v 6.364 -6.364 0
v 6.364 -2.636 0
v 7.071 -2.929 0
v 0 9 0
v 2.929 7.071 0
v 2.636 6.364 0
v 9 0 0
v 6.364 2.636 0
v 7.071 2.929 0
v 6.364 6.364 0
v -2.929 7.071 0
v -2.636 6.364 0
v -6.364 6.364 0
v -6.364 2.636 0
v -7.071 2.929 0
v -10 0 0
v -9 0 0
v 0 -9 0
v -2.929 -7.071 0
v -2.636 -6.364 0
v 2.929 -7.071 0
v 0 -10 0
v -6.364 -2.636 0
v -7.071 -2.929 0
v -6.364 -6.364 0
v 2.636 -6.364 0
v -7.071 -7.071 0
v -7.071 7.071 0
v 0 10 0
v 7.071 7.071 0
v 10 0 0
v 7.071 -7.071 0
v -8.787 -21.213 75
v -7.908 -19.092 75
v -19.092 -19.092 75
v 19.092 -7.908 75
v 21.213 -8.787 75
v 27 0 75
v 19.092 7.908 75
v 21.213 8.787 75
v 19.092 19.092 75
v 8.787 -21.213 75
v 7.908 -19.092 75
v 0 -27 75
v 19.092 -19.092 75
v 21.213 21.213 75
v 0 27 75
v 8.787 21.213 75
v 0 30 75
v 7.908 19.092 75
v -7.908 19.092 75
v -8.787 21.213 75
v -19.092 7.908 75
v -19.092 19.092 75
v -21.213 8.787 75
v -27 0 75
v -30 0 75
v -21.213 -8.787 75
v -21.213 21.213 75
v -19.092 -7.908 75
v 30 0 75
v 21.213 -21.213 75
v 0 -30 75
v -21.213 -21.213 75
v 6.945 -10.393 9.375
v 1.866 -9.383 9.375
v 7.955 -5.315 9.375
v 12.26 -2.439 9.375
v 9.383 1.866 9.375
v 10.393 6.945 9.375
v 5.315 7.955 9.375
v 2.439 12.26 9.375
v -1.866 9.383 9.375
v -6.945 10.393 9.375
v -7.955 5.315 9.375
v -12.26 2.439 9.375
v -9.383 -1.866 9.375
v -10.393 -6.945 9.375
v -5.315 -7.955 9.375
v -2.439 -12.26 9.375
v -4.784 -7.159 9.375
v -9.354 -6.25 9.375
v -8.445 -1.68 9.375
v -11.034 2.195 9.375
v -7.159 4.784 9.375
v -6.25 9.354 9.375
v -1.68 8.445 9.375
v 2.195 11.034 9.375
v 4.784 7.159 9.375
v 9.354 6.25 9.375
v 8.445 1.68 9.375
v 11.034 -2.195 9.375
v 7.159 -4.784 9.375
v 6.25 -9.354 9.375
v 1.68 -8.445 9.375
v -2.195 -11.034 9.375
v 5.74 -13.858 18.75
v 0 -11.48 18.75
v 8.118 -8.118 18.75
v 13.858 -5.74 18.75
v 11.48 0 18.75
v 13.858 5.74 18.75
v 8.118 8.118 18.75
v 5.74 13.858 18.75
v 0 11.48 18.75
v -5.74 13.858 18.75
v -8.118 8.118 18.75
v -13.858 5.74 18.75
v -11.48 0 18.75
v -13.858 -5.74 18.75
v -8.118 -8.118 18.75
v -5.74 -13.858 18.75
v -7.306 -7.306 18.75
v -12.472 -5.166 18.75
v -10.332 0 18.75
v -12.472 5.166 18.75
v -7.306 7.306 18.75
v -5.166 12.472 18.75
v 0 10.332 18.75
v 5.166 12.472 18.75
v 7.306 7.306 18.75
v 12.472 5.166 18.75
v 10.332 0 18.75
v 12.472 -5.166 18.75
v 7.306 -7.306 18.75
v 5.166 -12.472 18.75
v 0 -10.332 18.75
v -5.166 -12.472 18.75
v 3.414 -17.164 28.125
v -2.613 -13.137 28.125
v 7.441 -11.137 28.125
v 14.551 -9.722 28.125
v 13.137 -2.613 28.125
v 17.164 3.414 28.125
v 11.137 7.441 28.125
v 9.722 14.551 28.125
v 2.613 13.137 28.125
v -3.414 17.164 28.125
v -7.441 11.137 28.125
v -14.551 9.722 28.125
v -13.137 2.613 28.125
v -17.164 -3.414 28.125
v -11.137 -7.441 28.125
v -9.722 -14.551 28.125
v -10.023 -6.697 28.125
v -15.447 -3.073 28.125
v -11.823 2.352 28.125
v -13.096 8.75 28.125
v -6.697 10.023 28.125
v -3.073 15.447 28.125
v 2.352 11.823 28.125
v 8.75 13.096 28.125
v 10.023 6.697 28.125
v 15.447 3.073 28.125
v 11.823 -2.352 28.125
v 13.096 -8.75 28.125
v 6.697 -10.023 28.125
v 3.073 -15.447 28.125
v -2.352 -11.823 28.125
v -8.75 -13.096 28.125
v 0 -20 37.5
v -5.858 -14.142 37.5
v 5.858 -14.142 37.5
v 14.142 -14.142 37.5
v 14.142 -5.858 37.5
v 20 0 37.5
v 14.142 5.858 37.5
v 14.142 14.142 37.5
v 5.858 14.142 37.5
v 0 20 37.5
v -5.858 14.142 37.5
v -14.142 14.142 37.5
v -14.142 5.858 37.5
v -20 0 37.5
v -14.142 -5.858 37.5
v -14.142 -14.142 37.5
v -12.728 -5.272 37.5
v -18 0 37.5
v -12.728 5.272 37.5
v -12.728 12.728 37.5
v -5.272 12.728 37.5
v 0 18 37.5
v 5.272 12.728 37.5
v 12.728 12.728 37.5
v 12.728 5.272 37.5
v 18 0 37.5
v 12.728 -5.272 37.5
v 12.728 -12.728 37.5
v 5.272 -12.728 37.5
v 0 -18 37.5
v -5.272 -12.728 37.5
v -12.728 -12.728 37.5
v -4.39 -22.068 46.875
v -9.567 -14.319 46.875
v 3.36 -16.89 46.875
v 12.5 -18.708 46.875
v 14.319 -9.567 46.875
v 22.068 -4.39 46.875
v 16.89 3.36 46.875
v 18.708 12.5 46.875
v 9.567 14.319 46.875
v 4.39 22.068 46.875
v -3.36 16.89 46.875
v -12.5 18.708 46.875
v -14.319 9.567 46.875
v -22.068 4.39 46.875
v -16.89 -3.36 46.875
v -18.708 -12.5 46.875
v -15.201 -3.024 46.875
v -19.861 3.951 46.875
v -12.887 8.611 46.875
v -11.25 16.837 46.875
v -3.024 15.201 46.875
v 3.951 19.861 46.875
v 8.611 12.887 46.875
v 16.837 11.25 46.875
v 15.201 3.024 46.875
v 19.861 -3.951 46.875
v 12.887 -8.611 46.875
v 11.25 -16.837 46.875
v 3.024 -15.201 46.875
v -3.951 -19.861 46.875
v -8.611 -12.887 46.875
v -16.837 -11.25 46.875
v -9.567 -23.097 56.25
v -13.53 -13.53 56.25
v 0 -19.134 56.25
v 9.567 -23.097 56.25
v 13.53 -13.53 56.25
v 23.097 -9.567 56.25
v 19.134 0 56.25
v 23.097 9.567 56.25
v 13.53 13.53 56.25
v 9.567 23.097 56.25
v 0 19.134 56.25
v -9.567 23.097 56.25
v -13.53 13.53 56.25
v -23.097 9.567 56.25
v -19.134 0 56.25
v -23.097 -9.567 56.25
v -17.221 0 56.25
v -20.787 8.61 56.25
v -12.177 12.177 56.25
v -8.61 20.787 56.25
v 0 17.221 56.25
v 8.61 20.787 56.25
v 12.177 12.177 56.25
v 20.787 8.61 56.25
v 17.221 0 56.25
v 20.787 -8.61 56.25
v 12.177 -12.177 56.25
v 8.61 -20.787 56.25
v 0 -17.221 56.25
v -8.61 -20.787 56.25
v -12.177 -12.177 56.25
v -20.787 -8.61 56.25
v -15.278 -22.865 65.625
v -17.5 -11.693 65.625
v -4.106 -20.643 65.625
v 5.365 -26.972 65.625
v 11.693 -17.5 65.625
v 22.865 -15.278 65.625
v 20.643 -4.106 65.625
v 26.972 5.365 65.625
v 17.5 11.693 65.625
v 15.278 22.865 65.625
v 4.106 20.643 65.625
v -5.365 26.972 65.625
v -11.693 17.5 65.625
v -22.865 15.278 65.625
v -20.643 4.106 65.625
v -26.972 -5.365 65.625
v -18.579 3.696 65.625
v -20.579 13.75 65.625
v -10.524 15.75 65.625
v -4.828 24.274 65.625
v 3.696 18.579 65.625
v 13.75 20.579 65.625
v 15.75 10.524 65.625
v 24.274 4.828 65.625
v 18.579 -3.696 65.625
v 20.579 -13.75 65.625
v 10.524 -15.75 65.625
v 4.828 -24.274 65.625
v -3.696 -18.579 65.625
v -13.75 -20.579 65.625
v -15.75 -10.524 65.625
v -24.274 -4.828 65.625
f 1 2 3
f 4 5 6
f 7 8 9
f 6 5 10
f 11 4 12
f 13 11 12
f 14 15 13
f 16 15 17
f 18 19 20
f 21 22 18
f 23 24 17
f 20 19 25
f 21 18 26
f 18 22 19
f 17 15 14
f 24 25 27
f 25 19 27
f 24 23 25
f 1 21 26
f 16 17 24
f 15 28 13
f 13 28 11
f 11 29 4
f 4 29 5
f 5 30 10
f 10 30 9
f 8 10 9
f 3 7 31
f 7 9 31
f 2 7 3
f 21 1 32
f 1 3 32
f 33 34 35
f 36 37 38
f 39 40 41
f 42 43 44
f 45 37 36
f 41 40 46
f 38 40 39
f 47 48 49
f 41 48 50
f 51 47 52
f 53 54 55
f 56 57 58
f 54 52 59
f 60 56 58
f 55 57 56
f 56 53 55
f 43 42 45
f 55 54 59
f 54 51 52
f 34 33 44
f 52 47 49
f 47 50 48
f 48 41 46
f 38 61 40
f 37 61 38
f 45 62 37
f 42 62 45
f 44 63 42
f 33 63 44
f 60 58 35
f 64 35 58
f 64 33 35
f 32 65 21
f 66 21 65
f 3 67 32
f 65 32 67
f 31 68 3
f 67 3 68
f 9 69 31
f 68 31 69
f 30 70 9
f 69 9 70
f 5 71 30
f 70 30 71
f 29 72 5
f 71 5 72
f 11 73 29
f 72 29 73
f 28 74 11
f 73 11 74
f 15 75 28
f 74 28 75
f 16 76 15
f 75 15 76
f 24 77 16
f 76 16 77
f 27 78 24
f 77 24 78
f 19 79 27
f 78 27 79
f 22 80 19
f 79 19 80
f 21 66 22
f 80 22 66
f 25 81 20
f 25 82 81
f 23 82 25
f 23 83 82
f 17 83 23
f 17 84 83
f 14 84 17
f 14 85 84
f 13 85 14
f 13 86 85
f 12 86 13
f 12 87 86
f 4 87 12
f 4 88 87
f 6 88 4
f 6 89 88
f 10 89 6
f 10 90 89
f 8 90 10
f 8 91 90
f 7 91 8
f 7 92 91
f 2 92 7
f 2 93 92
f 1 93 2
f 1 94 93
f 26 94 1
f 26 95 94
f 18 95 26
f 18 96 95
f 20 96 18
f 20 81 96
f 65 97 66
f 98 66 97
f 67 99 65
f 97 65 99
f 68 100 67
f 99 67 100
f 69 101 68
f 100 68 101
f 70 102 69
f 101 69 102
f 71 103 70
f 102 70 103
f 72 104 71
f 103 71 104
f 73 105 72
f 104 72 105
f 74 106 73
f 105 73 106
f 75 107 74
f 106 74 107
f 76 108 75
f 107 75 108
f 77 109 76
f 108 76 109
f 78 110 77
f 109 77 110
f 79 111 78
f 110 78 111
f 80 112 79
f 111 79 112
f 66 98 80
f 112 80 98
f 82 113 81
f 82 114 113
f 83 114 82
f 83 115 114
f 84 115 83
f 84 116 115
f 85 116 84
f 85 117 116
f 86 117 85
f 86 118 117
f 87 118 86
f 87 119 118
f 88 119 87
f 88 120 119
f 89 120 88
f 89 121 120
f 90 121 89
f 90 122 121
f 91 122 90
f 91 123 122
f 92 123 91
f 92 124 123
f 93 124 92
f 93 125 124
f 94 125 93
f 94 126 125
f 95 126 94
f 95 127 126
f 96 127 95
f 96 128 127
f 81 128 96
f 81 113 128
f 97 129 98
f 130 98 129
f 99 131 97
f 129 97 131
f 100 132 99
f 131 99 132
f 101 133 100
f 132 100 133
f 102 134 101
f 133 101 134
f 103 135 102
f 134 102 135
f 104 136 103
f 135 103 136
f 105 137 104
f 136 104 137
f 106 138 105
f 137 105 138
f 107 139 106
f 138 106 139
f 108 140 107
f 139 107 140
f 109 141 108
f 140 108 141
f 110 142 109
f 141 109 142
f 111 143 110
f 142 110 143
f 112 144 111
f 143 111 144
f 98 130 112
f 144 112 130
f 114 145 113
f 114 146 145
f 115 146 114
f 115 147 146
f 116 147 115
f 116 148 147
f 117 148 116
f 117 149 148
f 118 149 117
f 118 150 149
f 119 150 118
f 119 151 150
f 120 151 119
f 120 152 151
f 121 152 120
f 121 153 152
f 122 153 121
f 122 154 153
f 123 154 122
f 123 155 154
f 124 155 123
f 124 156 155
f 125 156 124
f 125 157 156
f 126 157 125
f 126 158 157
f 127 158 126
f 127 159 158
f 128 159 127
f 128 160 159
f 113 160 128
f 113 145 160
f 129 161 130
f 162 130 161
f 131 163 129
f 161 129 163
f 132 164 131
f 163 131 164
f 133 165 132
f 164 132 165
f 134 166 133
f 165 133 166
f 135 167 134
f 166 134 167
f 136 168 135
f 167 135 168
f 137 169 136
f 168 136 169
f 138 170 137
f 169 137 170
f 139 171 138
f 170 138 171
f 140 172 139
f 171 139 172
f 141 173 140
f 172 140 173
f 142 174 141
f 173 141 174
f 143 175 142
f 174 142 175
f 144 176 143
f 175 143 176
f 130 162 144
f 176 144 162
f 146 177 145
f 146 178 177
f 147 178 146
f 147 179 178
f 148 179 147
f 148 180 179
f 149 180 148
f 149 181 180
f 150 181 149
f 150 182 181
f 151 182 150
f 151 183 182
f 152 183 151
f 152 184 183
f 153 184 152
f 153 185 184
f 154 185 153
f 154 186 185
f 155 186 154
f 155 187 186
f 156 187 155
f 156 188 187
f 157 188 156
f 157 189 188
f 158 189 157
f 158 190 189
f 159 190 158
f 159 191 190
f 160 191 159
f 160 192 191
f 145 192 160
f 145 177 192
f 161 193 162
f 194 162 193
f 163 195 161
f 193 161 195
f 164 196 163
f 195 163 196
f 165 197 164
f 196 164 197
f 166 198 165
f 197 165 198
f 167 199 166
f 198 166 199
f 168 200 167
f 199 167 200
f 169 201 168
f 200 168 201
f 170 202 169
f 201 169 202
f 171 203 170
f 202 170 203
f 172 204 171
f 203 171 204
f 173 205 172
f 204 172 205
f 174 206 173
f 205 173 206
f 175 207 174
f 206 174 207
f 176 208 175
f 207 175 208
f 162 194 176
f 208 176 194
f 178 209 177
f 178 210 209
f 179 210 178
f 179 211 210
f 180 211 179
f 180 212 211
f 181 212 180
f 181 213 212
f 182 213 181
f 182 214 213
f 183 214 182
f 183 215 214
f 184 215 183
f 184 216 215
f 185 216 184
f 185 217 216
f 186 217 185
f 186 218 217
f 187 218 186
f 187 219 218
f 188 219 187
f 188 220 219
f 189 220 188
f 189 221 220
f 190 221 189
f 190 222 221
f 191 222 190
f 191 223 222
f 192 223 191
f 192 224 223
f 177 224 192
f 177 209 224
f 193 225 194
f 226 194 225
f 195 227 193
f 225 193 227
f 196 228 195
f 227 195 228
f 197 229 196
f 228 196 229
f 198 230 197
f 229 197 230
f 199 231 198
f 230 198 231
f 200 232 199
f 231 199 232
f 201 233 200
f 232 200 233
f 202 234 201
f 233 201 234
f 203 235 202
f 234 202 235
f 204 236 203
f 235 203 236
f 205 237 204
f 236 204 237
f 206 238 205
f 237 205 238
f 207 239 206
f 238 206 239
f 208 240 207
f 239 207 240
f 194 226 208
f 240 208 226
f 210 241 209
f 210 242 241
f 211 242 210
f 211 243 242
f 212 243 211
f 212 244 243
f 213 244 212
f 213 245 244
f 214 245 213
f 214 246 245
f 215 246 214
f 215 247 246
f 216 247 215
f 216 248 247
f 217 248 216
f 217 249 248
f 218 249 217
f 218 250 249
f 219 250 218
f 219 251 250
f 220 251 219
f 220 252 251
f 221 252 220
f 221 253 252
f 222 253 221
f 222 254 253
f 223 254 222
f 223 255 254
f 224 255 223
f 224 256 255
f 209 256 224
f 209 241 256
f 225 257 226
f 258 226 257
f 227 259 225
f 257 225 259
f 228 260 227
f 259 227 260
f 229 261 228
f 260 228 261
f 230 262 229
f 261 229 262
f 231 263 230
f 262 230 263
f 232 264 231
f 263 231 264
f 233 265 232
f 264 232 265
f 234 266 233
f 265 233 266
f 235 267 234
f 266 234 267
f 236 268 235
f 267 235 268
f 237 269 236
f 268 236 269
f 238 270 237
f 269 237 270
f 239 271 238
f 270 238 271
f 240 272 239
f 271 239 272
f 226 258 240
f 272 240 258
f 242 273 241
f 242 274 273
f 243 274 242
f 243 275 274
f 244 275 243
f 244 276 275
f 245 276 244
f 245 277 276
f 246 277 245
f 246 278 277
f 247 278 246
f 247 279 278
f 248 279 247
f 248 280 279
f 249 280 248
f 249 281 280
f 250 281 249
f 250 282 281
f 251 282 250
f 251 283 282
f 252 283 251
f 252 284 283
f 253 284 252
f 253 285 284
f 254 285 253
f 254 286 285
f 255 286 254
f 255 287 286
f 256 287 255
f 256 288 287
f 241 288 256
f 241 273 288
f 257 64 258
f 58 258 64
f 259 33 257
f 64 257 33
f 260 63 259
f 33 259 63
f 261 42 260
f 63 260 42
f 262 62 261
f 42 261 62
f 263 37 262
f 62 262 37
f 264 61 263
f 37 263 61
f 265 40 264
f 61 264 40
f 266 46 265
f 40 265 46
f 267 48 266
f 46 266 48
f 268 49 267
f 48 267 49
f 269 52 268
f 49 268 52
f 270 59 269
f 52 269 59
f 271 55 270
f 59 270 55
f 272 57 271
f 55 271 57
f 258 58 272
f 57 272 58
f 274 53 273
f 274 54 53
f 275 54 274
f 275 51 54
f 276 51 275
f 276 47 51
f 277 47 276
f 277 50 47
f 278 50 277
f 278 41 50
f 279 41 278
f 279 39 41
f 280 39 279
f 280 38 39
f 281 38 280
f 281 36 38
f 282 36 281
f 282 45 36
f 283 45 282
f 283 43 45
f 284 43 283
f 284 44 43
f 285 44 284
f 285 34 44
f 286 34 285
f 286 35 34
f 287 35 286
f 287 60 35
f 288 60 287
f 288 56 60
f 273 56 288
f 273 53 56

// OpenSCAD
edges = 8;
radius = 10;
wall_thickness = 1;
height = 150;

linear_extrude(height=height/2, twist= 90, scale=3)
difference() {
    star(radius,edges);
    star(radius-wall_thickness, edges);
}


module star(radius, edges) {

    union(){
        circle(radius,$fn=edges/2);
        rotate([0,0,360/edges]) circle(radius,$fn=edges/2);
    }
}    
    
